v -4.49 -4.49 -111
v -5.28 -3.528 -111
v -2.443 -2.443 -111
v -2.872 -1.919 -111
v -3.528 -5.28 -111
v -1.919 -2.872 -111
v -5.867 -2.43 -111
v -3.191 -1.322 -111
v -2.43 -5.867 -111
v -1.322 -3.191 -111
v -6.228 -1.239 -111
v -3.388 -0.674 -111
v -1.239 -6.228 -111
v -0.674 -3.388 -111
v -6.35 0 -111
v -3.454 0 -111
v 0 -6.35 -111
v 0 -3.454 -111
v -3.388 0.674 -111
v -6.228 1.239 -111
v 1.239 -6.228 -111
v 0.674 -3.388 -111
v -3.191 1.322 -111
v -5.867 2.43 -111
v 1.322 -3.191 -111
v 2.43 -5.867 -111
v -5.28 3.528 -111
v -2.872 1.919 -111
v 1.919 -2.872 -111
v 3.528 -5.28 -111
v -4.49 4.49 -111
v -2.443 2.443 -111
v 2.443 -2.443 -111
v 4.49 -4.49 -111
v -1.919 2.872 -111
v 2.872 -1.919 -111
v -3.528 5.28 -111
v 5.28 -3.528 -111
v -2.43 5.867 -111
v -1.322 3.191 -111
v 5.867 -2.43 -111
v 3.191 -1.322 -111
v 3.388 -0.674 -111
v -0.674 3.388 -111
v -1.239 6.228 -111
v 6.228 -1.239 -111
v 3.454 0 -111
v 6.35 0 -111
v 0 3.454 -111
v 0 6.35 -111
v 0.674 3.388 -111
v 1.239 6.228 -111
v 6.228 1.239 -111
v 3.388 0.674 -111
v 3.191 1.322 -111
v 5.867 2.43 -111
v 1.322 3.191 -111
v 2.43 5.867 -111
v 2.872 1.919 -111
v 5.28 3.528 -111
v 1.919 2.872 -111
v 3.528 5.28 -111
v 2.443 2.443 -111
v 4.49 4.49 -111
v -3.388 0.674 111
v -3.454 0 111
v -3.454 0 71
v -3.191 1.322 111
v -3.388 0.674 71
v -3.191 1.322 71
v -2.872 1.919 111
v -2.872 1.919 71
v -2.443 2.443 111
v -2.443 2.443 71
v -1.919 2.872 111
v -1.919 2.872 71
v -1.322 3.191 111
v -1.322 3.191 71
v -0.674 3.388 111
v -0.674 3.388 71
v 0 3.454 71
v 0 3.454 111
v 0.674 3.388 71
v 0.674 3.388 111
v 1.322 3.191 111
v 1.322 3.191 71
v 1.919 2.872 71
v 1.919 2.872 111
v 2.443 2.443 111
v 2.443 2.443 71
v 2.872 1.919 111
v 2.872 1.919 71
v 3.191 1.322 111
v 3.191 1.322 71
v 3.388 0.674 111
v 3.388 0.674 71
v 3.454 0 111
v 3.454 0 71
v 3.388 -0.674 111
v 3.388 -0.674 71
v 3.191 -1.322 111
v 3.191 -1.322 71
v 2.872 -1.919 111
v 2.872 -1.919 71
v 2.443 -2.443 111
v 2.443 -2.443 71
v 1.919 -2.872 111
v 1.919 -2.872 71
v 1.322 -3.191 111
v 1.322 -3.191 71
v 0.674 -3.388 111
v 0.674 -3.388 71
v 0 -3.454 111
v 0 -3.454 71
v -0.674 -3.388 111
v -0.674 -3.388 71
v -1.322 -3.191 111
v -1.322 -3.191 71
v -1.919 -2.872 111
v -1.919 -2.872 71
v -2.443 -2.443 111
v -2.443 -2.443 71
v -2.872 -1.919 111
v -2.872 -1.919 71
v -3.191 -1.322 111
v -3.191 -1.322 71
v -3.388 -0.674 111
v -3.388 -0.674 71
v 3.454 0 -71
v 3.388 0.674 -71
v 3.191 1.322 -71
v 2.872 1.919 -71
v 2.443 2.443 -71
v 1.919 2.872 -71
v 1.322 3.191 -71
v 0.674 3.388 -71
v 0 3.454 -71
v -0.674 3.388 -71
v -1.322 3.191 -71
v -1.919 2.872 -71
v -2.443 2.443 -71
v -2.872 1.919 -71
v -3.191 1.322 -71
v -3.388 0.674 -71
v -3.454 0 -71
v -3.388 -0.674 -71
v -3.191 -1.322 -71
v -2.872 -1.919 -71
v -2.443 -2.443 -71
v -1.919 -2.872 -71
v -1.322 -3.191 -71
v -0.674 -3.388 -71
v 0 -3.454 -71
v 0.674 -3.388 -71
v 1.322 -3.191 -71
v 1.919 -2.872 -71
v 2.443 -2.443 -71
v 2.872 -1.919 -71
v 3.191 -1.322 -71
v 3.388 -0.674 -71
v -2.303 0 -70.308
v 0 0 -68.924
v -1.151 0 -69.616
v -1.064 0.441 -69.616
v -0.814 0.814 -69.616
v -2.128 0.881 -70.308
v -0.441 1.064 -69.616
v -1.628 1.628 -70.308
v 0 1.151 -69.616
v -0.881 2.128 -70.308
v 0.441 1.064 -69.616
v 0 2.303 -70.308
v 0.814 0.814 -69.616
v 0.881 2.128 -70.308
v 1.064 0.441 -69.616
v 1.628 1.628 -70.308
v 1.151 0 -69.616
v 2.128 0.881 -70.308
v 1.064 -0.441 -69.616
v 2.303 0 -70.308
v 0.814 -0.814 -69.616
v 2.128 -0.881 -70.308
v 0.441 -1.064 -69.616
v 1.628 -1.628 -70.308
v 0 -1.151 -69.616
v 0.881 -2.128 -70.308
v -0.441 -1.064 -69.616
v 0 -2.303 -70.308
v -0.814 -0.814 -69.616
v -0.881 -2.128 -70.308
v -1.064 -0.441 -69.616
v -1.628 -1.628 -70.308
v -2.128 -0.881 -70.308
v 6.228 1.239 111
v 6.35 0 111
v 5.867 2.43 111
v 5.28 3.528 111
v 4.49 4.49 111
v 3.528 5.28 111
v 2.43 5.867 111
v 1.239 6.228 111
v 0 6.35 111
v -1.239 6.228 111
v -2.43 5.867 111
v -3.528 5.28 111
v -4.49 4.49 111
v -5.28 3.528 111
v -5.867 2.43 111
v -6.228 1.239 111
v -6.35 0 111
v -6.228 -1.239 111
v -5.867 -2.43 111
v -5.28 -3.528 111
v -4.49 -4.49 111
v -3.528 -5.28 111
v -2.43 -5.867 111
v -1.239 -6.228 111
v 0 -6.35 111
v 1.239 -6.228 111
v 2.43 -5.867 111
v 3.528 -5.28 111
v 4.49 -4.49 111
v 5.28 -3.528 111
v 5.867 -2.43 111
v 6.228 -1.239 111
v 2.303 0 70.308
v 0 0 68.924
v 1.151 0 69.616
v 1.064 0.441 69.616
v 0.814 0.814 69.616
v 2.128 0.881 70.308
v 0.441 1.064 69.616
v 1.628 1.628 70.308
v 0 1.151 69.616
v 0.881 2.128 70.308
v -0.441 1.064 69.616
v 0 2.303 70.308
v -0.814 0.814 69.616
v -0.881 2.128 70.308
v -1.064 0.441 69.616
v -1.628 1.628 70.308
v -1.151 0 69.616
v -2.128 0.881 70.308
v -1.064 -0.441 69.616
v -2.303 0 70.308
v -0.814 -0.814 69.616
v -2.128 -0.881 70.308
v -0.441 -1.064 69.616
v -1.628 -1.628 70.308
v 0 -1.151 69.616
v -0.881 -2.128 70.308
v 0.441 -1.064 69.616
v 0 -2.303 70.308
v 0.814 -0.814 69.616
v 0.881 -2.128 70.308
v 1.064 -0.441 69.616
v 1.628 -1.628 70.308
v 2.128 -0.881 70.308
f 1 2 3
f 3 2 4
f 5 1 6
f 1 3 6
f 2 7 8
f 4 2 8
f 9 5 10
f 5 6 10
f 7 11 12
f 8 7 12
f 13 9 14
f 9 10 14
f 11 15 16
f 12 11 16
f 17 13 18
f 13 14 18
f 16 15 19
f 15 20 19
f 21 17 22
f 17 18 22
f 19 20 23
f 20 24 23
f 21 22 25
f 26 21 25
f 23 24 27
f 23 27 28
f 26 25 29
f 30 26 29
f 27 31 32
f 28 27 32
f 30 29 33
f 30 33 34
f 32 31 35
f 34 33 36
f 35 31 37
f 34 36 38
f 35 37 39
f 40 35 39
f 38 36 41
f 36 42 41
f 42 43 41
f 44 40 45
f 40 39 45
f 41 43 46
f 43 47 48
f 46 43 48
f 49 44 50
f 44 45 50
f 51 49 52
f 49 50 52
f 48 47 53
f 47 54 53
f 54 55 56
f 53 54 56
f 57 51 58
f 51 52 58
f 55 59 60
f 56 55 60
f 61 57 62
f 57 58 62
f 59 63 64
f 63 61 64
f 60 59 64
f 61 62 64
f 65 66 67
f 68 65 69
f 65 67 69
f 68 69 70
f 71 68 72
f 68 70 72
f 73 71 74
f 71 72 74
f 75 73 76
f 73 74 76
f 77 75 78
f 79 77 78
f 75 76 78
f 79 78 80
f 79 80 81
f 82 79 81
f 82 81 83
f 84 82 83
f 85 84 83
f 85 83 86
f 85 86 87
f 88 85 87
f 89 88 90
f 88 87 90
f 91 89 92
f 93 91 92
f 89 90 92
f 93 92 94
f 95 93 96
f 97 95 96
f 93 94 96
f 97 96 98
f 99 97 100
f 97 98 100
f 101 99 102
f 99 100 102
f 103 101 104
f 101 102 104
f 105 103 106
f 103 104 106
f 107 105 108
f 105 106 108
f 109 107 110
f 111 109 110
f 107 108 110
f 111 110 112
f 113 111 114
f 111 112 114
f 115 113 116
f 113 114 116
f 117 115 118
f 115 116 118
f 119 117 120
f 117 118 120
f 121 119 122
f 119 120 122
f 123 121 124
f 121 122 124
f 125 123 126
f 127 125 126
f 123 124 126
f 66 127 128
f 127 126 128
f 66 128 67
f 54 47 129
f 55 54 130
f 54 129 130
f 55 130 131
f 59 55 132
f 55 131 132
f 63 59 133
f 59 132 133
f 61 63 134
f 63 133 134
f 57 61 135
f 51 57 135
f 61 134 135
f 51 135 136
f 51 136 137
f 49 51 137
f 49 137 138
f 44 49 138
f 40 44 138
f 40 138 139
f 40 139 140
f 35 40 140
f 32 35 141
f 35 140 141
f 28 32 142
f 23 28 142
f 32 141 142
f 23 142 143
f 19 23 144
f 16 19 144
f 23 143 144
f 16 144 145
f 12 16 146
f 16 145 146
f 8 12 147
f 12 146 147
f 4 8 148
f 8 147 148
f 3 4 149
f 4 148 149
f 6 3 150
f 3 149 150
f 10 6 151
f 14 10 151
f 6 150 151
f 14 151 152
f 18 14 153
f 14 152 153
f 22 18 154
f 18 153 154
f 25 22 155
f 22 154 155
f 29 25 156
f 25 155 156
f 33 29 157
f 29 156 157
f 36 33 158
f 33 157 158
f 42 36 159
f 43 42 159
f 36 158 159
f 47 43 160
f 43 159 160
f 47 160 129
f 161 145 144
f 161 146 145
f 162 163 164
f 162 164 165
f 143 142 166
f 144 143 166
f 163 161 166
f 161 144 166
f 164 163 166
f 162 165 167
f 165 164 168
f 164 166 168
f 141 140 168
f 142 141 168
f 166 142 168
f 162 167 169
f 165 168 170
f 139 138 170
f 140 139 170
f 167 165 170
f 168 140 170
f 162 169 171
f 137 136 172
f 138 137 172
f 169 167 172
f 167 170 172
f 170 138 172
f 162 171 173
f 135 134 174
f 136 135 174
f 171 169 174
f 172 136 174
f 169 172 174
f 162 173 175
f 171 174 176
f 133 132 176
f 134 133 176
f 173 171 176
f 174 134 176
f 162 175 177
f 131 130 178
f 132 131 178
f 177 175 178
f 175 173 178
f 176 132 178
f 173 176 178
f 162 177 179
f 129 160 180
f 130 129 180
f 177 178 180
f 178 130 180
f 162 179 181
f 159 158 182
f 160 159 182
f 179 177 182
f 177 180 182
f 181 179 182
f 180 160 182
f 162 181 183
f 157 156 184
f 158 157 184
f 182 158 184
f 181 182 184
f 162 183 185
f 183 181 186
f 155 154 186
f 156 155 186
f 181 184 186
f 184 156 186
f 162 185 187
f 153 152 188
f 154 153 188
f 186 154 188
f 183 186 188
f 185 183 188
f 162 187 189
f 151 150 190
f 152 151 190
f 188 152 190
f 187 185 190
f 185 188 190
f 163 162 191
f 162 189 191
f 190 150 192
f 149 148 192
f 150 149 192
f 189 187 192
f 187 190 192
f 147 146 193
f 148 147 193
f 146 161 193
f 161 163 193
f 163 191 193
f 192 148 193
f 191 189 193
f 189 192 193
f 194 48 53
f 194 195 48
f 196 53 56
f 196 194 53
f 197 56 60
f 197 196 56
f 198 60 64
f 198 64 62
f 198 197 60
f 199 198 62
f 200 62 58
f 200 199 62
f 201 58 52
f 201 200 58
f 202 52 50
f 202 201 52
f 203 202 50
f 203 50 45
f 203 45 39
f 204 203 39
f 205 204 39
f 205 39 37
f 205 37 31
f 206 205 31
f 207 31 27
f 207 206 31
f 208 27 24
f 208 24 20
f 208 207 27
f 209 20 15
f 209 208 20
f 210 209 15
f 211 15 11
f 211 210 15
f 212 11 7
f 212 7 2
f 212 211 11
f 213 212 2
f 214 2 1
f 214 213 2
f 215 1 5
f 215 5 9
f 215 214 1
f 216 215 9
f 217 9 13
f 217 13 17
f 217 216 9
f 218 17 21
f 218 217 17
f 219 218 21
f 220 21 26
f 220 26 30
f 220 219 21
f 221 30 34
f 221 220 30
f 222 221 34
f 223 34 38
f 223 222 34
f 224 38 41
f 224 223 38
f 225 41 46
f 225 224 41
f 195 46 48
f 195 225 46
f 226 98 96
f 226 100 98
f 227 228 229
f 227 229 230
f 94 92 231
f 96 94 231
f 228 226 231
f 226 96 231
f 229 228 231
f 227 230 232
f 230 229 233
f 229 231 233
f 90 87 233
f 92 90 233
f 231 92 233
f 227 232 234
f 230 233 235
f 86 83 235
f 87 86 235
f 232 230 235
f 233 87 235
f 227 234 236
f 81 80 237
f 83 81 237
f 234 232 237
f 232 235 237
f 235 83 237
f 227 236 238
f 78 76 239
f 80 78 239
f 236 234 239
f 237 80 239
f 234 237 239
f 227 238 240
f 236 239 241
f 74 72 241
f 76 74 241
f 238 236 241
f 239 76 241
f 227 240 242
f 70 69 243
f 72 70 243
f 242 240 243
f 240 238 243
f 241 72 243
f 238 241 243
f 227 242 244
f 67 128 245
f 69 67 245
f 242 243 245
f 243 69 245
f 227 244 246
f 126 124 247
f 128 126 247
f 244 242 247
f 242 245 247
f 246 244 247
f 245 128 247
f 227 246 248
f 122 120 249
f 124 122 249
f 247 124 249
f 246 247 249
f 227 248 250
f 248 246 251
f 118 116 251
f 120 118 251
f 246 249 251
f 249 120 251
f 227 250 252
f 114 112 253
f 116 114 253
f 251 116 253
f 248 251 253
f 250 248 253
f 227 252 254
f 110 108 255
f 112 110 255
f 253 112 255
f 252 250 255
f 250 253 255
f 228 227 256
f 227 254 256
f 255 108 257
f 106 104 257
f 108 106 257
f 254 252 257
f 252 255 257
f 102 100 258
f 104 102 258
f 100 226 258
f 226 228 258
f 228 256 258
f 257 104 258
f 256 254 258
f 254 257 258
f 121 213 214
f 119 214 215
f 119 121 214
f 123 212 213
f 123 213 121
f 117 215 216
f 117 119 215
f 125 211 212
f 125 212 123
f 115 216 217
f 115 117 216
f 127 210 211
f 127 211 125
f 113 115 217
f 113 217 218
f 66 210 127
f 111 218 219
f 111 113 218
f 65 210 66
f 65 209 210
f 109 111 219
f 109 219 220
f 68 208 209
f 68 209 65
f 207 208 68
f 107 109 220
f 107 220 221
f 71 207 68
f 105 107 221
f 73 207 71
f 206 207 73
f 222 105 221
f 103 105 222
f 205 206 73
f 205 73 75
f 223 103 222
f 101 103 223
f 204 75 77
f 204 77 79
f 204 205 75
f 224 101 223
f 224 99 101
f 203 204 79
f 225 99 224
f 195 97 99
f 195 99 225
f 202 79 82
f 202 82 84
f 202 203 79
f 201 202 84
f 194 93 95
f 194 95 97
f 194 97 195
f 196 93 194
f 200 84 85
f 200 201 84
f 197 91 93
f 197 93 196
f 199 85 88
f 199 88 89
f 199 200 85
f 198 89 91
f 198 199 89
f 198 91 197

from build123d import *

# Parameters (mm, degrees)
BOSS_EXTRUDESHAFT_DEPTH                = 111
BOSS_EXTRUDESHAFT_DEPTH_BACK           = 111
SKETCH1_R                              = 6.35
F_5_16_24_TAPPED_HOLE2_D               = 6.9088
F_5_16_24_TAPPED_HOLE2_DEPTH           = 40
F_5_16_24_TAPPED_HOLE2_TIP             = 2.075612922
F_5_16_24_TAPPED_HOLE2_ON_FACE_2_D     = 6.9088
F_5_16_24_TAPPED_HOLE2_ON_FACE_2_DEPTH = 40
F_5_16_24_TAPPED_HOLE2_ON_FACE_2_TIP   = 2.075612922


with BuildPart() as part:
    # Sketch1 → Boss-ExtrudeShaft (new, two sides: drawn at the far end of the back side and taken through both)
    with BuildSketch(Plane.XY.offset(-BOSS_EXTRUDESHAFT_DEPTH_BACK)):
        Circle(SKETCH1_R)
    extrude(amount=BOSS_EXTRUDESHAFT_DEPTH + BOSS_EXTRUDESHAFT_DEPTH_BACK)

    # 5/16-24 Tapped Hole2
    with Locations(Plane(origin=(0, 0, -111), x_dir=(-1, 0, 0), z_dir=(0, 0, -1))):
        with Locations((0, 0)):
            Hole(F_5_16_24_TAPPED_HOLE2_D / 2, depth=F_5_16_24_TAPPED_HOLE2_DEPTH)
            with Locations((0, 0, -(F_5_16_24_TAPPED_HOLE2_DEPTH + F_5_16_24_TAPPED_HOLE2_TIP / 2))):  # 118° drill point
                Cone(0, F_5_16_24_TAPPED_HOLE2_D / 2, F_5_16_24_TAPPED_HOLE2_TIP, mode=Mode.SUBTRACT)

    # 5/16-24 Tapped Hole2 on face 2
    with Locations(Plane.XY.offset(111)):
        with Locations((0, 0)):
            Hole(F_5_16_24_TAPPED_HOLE2_ON_FACE_2_D / 2, depth=F_5_16_24_TAPPED_HOLE2_ON_FACE_2_DEPTH)
            with Locations((0, 0, -(F_5_16_24_TAPPED_HOLE2_ON_FACE_2_DEPTH + F_5_16_24_TAPPED_HOLE2_ON_FACE_2_TIP / 2))):  # 118° drill point
                Cone(0, F_5_16_24_TAPPED_HOLE2_ON_FACE_2_D / 2, F_5_16_24_TAPPED_HOLE2_ON_FACE_2_TIP, mode=Mode.SUBTRACT)


solid = part.part
